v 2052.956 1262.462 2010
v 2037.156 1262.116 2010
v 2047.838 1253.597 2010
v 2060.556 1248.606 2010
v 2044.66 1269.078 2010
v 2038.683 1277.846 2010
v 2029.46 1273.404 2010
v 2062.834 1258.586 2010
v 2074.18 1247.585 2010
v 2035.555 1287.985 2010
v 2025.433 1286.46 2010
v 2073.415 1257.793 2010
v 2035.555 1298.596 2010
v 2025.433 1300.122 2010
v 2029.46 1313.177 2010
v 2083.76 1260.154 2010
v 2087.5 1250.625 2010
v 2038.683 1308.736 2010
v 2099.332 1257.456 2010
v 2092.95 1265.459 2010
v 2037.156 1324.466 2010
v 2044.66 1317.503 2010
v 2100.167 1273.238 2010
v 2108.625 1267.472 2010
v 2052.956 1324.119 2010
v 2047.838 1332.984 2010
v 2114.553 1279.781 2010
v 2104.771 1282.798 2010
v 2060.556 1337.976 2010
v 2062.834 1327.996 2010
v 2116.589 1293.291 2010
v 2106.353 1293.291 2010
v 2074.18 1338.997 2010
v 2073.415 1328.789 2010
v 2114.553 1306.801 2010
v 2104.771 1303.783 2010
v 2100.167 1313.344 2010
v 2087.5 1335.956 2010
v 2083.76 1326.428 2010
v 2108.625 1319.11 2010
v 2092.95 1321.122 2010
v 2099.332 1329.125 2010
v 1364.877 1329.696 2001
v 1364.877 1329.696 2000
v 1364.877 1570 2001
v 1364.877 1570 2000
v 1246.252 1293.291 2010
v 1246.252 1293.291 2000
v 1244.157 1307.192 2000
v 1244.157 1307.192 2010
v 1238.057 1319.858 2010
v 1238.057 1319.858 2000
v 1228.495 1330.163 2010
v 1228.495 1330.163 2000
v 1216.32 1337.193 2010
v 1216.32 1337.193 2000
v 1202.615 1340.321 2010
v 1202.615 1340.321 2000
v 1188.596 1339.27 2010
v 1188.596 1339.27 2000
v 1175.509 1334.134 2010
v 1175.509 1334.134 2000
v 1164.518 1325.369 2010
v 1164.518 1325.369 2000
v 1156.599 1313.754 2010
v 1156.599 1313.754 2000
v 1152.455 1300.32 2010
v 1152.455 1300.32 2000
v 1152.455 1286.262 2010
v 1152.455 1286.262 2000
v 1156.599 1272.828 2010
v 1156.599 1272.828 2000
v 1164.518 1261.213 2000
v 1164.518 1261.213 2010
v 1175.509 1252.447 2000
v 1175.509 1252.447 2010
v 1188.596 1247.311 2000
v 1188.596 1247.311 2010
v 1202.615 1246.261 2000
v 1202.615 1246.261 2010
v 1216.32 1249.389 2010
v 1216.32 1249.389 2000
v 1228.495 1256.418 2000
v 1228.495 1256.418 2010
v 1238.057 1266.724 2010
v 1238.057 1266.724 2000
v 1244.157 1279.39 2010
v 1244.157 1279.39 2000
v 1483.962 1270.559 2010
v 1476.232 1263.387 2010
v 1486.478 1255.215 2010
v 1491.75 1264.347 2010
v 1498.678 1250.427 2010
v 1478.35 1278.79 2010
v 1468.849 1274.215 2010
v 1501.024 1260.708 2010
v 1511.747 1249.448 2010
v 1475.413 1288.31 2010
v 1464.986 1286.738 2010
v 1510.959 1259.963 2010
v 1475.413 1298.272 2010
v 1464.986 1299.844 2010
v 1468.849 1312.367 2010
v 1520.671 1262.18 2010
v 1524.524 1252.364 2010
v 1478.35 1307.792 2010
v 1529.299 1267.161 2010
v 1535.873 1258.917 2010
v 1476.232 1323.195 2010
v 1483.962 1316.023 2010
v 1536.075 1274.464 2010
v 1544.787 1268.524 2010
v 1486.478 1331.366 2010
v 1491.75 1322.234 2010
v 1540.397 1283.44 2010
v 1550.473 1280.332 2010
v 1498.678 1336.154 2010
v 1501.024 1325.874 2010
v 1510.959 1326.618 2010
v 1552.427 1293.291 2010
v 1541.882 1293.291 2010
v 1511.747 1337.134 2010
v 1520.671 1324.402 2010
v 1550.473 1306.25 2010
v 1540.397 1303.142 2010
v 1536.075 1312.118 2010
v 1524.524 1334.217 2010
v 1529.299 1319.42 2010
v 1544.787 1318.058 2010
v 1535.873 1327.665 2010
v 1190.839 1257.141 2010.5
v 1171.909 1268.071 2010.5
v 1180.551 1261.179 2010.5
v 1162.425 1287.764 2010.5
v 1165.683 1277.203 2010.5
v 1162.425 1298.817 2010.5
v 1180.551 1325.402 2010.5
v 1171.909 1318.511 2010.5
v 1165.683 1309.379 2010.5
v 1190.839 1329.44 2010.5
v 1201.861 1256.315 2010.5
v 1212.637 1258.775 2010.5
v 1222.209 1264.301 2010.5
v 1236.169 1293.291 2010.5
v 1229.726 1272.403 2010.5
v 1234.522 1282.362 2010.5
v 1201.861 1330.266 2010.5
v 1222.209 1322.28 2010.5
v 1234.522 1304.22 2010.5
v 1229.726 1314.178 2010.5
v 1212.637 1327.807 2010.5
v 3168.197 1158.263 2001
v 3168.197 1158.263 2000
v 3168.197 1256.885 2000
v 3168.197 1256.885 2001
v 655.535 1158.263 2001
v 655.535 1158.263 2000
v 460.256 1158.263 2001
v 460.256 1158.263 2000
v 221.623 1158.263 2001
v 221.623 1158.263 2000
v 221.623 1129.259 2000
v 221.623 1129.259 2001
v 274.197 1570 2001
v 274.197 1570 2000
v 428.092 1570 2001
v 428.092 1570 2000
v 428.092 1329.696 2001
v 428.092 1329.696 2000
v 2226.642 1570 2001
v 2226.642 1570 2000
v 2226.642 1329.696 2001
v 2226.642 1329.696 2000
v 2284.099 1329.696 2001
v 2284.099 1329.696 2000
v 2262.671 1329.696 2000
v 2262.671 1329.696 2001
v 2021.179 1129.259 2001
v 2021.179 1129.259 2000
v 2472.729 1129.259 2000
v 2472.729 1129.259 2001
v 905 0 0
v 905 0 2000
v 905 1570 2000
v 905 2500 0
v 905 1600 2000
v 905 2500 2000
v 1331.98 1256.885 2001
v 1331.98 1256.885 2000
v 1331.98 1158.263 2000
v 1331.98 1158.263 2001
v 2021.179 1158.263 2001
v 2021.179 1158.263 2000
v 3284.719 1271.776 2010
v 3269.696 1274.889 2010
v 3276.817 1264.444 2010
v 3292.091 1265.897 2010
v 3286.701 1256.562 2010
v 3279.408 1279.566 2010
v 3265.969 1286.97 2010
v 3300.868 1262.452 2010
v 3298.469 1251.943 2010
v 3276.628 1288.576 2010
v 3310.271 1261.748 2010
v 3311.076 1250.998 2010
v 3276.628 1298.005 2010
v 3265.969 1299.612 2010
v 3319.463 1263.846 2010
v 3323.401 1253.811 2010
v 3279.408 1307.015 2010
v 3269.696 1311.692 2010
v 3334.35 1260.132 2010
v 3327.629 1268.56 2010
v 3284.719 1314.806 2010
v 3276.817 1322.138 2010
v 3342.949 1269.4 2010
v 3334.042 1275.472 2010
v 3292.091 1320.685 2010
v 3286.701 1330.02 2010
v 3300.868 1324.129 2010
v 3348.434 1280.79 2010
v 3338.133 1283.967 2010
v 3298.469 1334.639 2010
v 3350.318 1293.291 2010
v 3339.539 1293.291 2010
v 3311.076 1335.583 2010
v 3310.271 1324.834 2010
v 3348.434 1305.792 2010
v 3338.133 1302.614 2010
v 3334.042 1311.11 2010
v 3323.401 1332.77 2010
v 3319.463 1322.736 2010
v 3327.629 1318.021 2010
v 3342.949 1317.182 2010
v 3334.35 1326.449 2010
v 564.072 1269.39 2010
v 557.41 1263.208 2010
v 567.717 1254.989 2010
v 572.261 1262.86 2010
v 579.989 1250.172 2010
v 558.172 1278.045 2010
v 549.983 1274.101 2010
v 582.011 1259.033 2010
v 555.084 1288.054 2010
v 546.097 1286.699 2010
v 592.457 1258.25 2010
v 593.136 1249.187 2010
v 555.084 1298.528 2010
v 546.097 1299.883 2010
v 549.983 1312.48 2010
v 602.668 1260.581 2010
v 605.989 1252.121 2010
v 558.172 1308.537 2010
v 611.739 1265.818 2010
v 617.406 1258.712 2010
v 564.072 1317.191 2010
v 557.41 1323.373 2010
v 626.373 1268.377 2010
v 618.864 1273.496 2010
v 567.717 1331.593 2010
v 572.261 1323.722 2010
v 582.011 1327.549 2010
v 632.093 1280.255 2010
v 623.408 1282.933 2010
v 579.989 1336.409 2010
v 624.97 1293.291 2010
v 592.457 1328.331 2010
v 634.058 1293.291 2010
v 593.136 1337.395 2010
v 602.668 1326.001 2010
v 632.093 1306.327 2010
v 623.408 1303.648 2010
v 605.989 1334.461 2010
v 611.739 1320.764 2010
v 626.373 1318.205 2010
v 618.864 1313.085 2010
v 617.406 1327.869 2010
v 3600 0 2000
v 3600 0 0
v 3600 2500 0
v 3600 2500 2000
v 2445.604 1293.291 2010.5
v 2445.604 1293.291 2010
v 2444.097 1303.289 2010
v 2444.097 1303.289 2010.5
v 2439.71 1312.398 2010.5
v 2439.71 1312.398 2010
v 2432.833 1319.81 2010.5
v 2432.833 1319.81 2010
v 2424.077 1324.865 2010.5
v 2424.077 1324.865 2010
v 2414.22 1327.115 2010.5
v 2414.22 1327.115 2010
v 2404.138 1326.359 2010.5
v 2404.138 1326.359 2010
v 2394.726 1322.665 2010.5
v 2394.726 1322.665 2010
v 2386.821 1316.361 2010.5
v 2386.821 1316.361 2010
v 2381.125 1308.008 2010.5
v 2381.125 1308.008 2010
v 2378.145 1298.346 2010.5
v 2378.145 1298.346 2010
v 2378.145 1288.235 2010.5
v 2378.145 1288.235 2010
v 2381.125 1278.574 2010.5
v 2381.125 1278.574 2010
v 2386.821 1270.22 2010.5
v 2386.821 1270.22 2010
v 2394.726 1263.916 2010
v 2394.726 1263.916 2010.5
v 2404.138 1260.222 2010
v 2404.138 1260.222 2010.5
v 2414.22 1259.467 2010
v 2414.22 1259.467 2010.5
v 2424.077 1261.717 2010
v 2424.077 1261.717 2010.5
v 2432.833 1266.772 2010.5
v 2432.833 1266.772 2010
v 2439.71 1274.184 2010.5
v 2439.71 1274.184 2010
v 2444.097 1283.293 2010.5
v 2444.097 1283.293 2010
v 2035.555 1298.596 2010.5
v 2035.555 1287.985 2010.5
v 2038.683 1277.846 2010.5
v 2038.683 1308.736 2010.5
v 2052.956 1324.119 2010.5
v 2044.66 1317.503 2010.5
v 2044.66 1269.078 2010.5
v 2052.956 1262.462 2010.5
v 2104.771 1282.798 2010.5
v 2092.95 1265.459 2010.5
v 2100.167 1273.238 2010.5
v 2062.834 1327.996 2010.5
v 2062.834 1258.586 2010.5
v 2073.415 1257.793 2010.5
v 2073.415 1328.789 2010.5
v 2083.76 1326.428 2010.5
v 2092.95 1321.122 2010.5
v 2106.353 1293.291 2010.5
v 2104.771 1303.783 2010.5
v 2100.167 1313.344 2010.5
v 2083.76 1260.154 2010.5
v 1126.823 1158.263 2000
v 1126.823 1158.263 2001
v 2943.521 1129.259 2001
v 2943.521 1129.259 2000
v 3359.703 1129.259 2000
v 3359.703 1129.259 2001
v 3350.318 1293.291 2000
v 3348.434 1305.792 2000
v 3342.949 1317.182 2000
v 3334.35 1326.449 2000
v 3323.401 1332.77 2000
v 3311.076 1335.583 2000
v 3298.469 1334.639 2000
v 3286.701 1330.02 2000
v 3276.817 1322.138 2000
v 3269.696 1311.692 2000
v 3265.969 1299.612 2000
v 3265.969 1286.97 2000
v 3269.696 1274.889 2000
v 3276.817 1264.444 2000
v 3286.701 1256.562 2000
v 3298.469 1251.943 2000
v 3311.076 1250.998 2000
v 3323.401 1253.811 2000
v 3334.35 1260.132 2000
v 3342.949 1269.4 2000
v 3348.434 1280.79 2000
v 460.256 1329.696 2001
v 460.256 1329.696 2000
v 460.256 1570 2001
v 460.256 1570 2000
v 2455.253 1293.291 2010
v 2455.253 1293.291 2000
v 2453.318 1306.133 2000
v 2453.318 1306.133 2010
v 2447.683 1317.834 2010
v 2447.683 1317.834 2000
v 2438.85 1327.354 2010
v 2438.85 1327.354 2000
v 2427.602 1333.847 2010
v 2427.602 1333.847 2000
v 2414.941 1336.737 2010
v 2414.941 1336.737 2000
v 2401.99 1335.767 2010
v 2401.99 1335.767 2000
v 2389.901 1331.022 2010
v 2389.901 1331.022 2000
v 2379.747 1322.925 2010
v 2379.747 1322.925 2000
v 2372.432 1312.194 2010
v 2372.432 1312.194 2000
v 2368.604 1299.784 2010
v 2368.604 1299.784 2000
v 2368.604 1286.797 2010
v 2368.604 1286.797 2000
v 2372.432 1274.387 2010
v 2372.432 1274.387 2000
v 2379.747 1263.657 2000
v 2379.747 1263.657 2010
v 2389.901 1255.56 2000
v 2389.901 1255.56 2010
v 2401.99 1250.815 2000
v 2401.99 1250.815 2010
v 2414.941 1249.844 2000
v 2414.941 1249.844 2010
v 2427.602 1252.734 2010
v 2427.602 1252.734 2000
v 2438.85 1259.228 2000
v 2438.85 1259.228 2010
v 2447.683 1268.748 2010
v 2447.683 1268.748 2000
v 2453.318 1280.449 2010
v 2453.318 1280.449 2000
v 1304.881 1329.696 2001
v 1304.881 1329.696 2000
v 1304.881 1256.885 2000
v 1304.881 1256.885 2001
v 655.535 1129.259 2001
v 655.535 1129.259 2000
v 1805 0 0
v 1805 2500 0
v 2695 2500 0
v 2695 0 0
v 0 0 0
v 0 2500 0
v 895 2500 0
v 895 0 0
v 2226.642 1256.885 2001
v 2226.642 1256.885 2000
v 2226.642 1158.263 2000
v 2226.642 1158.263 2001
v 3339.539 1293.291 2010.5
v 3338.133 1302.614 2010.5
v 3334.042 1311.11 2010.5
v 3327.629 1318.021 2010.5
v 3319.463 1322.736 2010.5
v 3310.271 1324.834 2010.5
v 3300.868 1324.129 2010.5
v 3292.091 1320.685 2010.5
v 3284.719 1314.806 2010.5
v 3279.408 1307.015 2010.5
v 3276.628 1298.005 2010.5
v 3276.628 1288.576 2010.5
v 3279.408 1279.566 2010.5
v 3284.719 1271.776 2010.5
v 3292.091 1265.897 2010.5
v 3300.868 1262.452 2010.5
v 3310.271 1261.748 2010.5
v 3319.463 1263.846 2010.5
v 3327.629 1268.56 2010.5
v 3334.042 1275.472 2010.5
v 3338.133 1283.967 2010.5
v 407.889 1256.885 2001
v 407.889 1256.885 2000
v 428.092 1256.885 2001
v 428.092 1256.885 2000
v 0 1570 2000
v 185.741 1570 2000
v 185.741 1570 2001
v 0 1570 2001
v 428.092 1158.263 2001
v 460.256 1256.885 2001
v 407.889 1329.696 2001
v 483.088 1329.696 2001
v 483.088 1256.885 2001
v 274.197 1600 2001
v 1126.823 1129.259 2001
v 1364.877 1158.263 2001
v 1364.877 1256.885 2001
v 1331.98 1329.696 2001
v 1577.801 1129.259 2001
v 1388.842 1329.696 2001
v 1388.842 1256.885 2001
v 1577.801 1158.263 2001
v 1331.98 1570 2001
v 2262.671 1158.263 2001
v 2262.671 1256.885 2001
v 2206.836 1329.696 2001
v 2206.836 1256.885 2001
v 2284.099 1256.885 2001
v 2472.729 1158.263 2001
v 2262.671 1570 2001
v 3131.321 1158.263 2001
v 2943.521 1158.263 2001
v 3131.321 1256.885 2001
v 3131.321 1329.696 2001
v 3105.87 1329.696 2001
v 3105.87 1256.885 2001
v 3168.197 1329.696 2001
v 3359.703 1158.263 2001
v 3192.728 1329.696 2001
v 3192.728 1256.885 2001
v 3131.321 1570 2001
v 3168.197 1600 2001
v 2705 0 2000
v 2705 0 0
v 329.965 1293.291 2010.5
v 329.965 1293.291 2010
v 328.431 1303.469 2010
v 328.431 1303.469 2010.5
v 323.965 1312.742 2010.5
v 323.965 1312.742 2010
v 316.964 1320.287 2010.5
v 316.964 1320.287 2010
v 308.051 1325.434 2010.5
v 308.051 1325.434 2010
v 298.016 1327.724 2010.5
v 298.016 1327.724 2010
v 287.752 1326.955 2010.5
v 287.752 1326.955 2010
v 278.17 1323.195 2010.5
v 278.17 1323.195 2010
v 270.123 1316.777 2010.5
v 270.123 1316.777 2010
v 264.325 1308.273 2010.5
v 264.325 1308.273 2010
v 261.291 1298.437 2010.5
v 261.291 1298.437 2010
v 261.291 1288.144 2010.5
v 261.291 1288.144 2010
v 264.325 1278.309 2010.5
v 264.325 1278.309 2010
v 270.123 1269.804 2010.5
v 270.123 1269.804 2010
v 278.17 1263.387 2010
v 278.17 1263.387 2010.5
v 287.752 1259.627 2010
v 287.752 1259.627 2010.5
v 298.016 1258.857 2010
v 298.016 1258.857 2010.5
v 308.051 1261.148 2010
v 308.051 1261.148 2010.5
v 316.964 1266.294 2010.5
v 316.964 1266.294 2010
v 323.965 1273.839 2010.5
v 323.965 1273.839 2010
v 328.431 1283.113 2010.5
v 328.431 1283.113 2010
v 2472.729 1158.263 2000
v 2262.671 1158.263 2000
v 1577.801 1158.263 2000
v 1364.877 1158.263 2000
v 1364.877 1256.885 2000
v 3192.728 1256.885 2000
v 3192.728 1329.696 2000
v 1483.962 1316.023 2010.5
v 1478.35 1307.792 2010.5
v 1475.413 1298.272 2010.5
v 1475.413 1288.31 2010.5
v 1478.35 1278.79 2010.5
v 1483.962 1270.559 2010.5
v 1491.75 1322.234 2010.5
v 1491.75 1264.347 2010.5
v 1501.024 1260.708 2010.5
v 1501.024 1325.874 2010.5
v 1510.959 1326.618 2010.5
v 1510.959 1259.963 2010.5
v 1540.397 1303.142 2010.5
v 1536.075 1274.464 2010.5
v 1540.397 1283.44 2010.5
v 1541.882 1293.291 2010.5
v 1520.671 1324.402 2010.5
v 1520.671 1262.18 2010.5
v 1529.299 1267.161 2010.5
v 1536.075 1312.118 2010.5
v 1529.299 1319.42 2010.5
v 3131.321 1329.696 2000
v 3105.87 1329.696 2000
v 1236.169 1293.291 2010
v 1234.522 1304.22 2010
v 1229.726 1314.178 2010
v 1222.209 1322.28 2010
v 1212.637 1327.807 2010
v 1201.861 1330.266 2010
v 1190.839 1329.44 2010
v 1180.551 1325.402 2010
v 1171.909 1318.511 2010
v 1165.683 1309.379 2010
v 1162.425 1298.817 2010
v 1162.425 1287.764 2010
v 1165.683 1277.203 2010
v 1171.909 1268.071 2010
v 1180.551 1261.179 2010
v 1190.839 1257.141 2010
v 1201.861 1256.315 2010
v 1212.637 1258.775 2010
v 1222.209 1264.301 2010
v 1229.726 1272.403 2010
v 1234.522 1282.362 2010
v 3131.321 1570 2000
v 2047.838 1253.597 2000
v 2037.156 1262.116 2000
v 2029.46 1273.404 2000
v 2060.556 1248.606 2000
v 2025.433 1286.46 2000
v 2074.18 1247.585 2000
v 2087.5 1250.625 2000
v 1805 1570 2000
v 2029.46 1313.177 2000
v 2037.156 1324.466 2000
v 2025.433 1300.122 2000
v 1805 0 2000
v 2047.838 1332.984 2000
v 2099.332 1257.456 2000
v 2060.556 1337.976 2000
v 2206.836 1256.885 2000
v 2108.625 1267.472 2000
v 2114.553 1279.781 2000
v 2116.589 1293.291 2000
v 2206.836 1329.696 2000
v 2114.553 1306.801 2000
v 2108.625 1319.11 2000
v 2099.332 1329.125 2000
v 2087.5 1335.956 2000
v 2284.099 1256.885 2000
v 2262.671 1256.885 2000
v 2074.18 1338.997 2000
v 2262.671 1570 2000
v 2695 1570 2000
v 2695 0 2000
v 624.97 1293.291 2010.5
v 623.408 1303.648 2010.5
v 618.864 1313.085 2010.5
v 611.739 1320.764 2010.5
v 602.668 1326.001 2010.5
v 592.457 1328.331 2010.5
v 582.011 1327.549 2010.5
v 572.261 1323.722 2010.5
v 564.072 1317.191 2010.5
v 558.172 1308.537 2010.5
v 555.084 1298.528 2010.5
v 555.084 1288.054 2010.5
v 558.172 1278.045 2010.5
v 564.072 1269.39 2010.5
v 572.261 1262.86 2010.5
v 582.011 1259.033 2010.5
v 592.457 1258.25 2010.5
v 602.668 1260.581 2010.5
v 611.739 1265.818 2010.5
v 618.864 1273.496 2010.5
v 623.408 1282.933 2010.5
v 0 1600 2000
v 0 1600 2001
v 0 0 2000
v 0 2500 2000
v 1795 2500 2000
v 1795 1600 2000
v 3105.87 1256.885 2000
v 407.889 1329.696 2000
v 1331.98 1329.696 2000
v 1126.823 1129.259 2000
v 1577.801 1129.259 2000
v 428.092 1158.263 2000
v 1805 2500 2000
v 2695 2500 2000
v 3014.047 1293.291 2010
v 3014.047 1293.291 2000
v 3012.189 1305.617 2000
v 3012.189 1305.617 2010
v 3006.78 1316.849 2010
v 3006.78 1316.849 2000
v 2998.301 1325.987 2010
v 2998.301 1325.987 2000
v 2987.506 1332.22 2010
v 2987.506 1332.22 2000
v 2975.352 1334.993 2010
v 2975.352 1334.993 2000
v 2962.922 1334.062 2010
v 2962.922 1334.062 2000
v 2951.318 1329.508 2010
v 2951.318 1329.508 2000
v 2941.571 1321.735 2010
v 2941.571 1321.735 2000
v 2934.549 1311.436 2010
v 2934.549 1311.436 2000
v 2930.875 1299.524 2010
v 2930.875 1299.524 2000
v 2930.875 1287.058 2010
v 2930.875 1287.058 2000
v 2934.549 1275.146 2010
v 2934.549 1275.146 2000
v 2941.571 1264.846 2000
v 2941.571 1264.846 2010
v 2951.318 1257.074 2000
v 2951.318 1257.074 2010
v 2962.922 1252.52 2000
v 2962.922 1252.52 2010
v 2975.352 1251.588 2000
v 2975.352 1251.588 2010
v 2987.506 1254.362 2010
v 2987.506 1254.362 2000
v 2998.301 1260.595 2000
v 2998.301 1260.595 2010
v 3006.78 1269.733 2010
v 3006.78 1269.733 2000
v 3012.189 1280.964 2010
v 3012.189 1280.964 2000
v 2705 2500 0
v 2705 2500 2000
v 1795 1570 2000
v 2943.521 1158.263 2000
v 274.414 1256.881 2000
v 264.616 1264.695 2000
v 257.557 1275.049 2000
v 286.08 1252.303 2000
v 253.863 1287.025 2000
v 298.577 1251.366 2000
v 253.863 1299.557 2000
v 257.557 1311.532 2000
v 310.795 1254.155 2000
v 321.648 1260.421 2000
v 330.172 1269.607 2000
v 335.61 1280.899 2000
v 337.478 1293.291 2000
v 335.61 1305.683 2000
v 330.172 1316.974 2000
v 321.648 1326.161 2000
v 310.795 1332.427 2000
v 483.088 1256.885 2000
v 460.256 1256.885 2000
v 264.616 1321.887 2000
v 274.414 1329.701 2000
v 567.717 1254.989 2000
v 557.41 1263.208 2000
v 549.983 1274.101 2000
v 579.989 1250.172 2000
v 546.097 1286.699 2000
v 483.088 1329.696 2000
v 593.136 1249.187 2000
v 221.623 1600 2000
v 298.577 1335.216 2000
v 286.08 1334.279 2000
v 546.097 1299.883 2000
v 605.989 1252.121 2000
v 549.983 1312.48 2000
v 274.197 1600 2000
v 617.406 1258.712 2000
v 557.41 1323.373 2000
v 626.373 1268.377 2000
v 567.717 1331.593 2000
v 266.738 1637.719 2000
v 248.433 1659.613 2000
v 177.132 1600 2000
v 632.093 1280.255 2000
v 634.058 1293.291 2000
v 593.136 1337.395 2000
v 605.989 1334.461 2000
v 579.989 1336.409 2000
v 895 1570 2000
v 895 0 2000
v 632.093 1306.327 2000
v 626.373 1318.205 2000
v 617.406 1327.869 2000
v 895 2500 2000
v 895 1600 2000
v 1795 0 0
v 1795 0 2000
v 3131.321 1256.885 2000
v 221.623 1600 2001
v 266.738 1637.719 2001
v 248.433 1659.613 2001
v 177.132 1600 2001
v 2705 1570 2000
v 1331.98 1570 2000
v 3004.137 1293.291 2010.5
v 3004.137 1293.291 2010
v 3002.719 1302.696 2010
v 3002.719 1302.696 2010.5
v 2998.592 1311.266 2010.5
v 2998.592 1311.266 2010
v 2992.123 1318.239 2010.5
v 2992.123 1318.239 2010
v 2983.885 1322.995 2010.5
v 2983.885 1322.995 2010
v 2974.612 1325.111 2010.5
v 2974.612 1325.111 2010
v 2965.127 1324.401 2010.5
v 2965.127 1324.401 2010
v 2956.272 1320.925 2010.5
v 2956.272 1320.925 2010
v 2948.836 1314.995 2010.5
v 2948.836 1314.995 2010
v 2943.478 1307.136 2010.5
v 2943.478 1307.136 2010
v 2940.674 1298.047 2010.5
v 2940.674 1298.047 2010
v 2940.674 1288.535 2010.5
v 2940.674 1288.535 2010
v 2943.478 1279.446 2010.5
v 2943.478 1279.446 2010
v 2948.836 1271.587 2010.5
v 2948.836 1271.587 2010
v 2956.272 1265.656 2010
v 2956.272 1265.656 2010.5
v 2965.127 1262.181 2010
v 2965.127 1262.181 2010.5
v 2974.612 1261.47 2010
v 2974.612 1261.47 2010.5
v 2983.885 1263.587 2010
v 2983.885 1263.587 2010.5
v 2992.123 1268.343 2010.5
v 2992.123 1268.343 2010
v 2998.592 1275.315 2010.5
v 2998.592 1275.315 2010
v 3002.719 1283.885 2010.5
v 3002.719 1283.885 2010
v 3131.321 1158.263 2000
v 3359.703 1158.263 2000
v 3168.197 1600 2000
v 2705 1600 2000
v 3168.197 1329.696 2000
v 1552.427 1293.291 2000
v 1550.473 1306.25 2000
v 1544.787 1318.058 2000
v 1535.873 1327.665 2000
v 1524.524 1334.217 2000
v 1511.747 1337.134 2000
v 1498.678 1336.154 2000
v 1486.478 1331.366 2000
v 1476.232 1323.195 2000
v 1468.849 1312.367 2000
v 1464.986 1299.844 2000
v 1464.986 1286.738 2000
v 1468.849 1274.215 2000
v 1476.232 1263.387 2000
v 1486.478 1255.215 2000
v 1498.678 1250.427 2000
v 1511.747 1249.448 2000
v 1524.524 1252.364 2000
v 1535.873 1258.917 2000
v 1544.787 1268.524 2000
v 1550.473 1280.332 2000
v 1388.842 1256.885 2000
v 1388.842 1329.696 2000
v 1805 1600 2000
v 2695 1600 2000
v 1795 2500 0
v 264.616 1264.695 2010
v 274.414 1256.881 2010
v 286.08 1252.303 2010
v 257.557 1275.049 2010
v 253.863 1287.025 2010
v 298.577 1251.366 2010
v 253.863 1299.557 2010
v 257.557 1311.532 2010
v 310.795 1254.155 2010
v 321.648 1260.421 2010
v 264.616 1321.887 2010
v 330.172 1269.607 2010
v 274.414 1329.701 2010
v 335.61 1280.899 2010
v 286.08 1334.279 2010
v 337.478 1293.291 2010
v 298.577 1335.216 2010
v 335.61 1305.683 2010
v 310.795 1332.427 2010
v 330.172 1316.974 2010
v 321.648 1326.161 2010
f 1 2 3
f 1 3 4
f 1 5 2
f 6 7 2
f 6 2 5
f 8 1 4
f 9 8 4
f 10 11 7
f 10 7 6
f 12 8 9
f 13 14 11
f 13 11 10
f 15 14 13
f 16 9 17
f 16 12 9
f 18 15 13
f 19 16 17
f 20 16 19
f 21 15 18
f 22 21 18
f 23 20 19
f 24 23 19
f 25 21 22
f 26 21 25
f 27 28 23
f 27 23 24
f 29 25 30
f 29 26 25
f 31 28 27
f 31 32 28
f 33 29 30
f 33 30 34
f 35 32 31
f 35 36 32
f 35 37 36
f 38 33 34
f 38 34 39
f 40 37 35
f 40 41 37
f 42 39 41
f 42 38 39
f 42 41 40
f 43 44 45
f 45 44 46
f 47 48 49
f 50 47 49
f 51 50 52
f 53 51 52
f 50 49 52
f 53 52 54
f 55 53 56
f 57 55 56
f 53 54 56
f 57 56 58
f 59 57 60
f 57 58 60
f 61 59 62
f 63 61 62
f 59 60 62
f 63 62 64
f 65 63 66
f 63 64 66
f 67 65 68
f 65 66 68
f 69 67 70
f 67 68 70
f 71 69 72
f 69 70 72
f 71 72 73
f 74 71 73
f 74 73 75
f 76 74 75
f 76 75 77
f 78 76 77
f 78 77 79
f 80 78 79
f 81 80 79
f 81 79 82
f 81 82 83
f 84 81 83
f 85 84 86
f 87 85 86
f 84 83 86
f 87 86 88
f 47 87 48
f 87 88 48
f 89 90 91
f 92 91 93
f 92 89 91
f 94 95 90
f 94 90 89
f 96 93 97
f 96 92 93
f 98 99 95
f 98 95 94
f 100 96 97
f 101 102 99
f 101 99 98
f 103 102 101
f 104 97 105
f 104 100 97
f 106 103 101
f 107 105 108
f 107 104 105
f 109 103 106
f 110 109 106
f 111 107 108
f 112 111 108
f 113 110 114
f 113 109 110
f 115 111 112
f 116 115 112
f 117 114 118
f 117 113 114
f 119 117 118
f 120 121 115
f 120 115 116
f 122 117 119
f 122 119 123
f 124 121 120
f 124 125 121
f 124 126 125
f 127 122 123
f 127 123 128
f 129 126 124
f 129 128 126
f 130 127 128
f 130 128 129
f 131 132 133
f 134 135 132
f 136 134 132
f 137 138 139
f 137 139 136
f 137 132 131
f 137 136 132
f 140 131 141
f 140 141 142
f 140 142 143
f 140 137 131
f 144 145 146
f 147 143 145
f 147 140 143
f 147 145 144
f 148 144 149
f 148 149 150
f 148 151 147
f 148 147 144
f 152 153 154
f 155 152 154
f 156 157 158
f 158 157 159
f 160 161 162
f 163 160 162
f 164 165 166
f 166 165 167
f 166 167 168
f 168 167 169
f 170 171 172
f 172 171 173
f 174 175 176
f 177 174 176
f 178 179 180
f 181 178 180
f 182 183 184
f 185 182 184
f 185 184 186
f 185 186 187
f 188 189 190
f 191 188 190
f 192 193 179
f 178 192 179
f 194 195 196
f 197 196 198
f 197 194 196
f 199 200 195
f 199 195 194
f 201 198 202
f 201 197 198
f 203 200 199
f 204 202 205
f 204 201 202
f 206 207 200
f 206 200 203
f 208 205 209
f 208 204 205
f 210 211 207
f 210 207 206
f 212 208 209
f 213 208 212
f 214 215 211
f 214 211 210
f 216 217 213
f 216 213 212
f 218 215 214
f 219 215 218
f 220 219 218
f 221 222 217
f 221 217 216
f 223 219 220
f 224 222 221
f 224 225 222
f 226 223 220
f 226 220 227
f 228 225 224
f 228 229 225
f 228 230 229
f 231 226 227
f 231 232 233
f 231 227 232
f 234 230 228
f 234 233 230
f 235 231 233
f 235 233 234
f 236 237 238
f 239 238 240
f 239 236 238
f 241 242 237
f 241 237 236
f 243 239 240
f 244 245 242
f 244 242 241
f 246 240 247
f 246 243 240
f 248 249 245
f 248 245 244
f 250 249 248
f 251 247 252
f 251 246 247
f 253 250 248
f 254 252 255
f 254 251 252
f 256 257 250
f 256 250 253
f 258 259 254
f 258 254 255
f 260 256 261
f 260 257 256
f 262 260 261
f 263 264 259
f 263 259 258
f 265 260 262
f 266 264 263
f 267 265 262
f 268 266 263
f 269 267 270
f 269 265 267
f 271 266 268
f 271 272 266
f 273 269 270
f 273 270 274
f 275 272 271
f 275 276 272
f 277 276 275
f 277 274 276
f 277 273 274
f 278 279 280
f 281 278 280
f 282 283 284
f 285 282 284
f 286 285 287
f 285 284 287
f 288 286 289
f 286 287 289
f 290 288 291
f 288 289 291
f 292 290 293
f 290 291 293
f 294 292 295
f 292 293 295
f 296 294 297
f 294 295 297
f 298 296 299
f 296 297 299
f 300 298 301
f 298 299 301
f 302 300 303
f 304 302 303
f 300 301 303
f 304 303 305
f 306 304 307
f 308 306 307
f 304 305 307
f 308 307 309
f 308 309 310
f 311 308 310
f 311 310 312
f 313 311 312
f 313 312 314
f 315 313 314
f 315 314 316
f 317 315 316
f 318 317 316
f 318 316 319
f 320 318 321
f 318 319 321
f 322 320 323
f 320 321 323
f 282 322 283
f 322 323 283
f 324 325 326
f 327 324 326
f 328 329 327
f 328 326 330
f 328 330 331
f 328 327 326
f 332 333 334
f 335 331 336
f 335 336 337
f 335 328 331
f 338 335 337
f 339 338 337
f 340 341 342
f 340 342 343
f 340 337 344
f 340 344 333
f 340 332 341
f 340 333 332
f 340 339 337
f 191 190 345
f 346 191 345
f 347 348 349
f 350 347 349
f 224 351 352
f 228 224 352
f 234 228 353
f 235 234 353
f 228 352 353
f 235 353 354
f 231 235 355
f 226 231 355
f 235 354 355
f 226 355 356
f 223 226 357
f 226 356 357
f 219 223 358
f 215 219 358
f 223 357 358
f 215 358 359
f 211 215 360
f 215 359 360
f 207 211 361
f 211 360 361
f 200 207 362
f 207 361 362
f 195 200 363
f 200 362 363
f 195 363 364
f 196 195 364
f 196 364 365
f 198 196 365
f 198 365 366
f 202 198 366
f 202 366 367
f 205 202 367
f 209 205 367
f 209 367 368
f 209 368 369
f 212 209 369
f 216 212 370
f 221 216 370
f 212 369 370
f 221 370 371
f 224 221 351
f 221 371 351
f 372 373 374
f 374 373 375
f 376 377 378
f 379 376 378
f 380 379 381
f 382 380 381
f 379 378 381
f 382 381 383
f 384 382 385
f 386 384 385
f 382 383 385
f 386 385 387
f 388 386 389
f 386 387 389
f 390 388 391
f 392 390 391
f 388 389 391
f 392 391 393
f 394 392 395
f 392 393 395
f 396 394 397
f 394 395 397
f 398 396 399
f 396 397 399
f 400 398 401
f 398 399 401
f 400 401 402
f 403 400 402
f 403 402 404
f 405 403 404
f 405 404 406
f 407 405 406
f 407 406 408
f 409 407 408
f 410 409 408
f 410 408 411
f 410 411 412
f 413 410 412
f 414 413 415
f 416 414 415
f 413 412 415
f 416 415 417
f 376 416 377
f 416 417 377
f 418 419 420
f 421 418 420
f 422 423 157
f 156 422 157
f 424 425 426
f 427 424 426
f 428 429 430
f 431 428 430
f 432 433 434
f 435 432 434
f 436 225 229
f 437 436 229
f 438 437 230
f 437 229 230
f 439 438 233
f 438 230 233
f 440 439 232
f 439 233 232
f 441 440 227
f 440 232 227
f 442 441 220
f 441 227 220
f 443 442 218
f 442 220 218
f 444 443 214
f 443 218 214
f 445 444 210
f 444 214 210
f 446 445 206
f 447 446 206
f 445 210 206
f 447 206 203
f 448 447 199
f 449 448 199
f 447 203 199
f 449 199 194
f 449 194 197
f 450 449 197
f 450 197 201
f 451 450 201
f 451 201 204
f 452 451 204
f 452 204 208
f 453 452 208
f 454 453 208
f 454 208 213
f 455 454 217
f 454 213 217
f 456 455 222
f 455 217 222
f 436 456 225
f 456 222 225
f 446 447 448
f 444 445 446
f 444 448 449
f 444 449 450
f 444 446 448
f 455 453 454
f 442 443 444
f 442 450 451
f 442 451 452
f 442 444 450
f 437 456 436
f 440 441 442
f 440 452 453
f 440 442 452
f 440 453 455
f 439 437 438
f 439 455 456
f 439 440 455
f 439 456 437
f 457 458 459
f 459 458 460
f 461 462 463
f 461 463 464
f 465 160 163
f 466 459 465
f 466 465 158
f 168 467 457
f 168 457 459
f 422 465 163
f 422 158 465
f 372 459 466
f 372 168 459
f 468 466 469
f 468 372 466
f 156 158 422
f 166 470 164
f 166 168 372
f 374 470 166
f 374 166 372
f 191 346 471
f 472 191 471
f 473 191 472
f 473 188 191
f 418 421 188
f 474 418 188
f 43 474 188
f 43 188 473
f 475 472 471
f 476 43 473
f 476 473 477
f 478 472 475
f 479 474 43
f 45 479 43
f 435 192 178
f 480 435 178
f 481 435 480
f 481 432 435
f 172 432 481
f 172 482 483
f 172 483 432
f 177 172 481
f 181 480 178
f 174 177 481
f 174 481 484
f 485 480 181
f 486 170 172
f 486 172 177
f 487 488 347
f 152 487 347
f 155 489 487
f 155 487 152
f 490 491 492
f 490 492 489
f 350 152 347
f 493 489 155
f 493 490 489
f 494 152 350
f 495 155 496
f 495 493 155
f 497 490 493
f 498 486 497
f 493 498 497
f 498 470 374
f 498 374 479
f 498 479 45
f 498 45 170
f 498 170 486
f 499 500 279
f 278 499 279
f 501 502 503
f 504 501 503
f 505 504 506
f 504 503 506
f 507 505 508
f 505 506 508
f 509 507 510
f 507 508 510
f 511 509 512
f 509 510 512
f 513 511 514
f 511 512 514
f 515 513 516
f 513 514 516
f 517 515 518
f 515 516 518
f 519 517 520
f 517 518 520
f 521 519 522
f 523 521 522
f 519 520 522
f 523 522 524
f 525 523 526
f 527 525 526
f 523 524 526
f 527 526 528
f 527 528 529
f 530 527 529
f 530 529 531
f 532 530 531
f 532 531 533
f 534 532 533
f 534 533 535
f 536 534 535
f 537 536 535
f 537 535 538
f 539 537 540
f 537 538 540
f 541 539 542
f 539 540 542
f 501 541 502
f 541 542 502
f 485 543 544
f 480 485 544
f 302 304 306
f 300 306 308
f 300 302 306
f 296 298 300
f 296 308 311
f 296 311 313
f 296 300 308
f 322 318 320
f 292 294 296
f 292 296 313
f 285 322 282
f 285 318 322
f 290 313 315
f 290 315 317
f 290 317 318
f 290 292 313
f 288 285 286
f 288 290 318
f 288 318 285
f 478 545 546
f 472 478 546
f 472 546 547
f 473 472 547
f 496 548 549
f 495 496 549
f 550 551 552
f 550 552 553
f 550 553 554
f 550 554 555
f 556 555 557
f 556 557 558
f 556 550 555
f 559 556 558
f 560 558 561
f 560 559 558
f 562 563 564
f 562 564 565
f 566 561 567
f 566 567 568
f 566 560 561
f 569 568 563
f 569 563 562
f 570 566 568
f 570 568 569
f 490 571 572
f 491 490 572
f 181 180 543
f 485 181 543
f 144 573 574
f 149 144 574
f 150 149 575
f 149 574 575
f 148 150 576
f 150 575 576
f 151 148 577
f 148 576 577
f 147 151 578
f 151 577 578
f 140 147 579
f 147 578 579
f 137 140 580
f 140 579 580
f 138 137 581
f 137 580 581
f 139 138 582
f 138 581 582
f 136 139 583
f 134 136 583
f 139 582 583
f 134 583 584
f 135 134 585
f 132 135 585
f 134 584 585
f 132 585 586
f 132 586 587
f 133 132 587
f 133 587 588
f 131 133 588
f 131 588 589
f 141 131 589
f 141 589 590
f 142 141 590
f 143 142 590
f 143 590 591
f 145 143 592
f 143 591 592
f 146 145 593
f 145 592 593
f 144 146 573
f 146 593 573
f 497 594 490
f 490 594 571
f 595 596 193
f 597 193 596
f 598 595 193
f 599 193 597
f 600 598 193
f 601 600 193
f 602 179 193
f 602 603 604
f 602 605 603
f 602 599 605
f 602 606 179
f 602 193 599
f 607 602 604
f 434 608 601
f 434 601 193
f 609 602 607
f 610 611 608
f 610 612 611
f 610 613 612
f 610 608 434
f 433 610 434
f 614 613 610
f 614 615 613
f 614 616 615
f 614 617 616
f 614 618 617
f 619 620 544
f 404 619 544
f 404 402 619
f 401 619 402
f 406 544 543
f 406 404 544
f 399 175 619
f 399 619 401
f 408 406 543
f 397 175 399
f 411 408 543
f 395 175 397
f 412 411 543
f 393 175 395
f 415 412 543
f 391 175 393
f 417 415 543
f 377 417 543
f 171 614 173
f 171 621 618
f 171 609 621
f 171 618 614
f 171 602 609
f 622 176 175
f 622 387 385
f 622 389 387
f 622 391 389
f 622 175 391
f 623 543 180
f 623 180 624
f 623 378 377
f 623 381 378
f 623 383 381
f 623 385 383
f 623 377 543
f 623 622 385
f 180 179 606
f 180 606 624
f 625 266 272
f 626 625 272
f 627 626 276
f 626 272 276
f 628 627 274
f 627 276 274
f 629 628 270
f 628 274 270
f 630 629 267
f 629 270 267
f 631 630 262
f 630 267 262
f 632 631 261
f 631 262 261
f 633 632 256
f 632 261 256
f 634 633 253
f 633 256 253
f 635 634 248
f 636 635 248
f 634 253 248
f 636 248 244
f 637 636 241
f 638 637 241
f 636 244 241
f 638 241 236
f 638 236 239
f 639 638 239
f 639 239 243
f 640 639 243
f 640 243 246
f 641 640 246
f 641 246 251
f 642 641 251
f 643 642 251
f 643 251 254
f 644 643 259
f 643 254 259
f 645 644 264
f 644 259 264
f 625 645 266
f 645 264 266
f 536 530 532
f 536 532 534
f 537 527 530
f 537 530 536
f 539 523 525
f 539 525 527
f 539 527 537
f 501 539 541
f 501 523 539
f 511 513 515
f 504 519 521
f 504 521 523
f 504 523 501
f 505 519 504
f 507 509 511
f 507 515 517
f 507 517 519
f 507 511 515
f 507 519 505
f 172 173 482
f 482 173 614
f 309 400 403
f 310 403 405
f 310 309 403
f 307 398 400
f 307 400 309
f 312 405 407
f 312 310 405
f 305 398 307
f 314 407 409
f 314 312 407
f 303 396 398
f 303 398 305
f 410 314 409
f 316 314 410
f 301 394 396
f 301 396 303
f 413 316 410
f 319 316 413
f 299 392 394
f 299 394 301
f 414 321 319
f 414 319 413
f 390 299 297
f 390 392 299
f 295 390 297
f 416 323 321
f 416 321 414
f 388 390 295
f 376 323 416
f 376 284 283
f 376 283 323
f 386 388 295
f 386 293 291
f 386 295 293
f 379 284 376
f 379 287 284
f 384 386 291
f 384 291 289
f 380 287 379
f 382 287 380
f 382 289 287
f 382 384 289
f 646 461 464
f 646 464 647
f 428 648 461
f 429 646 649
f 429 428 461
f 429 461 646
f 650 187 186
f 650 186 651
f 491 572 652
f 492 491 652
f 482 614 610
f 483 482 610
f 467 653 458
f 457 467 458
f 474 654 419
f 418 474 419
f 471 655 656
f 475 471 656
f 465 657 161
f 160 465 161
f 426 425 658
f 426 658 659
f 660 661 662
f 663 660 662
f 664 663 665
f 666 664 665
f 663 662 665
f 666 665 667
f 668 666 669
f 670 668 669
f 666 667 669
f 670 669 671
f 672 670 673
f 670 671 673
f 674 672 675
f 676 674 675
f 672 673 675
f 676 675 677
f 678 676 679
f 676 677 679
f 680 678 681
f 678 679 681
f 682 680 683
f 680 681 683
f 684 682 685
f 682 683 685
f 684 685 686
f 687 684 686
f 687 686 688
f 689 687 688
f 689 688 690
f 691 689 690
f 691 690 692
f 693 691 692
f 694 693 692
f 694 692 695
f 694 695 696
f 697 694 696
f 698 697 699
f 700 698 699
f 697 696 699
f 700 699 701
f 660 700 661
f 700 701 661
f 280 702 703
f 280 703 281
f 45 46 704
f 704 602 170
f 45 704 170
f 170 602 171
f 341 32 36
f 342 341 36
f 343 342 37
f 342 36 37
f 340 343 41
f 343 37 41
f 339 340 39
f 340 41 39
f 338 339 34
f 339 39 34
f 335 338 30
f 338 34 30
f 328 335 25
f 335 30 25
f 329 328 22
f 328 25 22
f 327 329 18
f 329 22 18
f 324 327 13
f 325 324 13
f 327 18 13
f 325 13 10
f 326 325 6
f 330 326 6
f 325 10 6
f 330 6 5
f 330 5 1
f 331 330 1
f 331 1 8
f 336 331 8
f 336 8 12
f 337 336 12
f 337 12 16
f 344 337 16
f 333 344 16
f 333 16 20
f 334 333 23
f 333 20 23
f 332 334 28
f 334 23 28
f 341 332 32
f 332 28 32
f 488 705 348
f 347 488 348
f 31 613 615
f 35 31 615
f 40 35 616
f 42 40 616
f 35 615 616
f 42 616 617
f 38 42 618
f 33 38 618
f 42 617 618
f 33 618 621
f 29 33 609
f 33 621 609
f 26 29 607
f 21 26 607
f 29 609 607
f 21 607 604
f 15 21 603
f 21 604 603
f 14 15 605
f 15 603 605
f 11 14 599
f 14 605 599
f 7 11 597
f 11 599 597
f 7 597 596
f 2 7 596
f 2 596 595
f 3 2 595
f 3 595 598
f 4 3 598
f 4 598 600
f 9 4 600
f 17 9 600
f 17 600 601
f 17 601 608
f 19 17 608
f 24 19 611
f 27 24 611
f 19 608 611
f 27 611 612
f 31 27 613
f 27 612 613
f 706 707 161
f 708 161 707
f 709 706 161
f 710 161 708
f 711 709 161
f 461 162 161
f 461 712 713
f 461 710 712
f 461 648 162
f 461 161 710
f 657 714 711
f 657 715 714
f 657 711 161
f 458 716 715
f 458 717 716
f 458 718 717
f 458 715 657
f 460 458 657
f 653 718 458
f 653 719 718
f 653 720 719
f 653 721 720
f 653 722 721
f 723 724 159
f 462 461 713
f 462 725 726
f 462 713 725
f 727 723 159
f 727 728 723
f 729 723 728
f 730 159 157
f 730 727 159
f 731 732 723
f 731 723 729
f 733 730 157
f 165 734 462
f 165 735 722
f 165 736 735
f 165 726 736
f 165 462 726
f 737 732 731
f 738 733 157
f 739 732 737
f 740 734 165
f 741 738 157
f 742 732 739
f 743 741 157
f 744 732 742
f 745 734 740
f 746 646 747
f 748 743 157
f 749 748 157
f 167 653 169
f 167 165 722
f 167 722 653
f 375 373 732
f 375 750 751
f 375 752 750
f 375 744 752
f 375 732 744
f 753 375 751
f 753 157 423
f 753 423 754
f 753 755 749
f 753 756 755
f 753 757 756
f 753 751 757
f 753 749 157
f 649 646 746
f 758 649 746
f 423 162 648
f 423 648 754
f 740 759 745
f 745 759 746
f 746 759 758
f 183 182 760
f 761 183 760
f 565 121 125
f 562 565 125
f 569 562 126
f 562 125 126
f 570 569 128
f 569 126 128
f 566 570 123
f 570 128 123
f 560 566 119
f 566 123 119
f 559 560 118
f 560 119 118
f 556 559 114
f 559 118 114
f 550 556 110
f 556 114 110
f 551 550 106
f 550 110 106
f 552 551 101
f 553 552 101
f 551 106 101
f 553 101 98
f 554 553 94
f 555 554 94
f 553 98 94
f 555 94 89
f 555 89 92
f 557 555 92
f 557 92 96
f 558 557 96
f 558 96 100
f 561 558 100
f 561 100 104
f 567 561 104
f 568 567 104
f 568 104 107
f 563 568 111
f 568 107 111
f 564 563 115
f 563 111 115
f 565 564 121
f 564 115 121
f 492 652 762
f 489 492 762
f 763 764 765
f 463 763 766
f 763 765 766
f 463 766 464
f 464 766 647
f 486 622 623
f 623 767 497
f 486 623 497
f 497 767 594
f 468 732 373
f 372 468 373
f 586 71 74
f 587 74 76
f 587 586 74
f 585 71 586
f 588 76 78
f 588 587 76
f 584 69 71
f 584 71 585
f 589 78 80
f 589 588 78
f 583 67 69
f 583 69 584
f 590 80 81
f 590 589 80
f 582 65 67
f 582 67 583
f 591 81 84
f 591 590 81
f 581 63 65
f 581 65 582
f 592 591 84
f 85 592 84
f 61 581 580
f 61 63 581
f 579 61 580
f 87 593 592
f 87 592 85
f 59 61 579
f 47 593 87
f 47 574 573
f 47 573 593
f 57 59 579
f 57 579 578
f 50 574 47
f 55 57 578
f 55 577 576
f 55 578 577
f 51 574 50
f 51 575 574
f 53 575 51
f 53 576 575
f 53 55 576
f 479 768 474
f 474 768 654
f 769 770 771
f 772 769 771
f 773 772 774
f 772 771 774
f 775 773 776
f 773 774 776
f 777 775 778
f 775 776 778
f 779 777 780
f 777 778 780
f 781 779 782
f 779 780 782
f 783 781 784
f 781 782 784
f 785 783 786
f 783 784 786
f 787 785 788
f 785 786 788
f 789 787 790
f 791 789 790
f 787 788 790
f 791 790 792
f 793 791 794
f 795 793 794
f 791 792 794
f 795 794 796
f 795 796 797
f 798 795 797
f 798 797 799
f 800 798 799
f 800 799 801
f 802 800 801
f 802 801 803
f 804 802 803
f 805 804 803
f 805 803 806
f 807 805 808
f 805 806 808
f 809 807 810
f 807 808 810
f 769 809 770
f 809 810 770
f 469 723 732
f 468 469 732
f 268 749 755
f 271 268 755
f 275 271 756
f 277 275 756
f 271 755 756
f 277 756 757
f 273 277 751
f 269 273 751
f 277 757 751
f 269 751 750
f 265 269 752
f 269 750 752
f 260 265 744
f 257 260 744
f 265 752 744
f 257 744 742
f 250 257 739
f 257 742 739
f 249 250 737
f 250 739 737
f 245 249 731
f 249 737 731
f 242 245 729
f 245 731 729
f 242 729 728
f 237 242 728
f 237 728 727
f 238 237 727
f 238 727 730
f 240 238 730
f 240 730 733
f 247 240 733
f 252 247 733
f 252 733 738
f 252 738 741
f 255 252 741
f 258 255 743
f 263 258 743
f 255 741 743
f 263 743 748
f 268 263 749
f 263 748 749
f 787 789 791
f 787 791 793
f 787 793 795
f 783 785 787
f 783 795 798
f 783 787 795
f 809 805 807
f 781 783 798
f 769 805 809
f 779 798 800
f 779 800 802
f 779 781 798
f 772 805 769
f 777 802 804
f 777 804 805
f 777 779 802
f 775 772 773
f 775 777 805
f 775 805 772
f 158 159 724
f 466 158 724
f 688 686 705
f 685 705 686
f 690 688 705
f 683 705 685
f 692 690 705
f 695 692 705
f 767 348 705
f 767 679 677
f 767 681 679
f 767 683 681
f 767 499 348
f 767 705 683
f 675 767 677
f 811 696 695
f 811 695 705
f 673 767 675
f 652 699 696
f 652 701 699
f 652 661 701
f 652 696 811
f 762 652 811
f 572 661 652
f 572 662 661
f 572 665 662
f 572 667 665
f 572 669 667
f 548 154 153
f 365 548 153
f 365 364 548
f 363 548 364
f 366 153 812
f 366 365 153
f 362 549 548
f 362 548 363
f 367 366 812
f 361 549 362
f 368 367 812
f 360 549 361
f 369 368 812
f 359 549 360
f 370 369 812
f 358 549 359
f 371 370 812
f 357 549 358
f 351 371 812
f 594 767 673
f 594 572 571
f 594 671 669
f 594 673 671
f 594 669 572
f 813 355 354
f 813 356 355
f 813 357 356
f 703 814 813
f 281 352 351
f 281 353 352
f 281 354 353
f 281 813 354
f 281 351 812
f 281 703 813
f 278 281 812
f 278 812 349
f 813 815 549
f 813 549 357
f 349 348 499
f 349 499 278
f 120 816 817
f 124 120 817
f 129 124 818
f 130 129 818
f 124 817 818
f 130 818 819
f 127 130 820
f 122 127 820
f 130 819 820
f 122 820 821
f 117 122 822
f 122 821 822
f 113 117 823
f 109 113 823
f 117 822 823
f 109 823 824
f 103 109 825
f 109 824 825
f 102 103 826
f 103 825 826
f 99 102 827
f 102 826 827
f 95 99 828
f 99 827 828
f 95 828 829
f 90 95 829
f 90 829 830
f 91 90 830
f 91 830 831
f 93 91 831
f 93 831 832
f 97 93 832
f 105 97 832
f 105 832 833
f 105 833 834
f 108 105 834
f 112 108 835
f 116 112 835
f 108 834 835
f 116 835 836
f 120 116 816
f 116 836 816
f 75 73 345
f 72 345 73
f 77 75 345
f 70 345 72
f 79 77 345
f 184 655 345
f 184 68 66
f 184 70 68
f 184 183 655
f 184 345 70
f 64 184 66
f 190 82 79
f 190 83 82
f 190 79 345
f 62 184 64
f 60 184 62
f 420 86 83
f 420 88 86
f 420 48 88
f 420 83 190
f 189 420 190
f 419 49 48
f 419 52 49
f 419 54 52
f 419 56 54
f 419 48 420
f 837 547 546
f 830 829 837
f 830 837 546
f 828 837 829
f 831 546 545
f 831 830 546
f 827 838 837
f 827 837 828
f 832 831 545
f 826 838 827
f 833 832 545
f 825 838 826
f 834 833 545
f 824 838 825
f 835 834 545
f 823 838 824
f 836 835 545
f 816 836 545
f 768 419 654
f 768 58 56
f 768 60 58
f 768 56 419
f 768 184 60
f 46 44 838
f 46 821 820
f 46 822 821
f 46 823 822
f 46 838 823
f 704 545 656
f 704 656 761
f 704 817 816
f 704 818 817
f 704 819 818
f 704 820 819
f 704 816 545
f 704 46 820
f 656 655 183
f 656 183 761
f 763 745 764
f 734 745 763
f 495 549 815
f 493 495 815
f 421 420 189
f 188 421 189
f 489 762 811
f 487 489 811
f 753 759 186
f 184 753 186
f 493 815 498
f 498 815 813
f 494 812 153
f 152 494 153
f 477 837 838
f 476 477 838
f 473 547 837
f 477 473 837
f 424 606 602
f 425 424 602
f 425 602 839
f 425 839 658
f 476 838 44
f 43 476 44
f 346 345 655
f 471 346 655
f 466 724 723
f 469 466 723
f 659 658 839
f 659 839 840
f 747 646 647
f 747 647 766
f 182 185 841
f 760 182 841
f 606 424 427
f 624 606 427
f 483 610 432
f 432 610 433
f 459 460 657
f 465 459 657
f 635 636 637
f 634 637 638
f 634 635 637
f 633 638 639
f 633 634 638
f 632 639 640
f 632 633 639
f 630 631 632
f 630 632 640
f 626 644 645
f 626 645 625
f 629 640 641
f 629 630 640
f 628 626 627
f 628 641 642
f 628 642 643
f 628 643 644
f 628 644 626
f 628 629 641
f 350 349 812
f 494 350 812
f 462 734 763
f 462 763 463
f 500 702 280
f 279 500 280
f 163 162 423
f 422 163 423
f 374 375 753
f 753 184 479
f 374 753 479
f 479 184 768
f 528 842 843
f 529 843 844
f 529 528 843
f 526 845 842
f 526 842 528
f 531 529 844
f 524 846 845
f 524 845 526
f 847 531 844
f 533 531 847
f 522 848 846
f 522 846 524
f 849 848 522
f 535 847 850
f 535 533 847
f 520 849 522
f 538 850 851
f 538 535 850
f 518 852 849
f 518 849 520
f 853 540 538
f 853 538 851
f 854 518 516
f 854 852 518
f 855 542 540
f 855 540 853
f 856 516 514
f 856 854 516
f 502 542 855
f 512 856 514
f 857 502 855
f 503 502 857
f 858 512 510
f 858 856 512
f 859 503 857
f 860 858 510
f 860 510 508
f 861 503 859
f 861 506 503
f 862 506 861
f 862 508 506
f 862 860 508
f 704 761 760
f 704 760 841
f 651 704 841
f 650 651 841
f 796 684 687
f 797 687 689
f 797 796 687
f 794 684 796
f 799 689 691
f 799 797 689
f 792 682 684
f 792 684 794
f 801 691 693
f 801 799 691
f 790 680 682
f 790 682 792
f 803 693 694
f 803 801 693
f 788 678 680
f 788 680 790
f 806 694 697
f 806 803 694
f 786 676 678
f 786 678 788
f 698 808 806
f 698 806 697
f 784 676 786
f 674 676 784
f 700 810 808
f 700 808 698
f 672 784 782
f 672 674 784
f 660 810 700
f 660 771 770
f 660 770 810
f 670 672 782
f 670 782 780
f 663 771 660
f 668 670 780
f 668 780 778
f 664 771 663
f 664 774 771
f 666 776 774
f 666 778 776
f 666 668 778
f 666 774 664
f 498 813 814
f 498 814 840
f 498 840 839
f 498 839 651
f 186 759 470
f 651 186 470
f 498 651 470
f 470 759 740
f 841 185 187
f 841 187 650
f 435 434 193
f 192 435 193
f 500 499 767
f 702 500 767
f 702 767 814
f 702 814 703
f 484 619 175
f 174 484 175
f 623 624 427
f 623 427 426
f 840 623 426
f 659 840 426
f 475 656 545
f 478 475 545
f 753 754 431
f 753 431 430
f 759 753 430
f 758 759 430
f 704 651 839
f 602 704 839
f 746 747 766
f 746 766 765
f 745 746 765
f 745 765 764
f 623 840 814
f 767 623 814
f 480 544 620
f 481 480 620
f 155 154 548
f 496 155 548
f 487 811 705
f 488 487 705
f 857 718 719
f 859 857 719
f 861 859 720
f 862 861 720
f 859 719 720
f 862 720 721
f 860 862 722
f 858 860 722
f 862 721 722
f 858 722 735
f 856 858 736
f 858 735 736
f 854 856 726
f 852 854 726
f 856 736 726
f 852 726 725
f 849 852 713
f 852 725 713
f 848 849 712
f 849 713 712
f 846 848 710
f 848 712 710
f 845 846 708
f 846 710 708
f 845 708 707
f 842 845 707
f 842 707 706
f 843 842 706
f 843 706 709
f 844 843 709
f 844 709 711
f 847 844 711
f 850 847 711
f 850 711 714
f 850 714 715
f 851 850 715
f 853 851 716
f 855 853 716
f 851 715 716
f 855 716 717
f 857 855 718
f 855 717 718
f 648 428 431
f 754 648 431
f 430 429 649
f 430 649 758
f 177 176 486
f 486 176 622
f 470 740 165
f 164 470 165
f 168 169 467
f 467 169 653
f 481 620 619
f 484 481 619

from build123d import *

# Parameters (mm, degrees)
CROQUIS1_W              = 3600
CROQUIS1_H              = 2500
SALIENTE_EXTRUIR1_DEPTH = 2000
CROQUIS3_W              = 10
CROQUIS3_H              = 2500
CORTAR_EXTRUIR1_DEPTH   = 2000
SALIENTE_EXTRUIR2_DEPTH = 1
CROQUIS5_R              = 42.042349856
CROQUIS5_R_2            = 44.227433636
CROQUIS5_R_3            = 47.161857107
CROQUIS5_R_4            = 43.965695281
CROQUIS5_R_5            = 45.833892846
CROQUIS5_R_6            = 43.568215229
CROQUIS5_R_7            = 41.81955042
CROQUIS5_R_8            = 42.411091006
SALIENTE_EXTRUIR3_DEPTH = 10
CROQUIS6_R              = 34.529979584
CROQUIS6_R_2            = 35.138962303
CROQUIS6_R_3            = 37.079078028
CROQUIS6_R_4            = 33.421162006
CROQUIS6_R_5            = 35.597607771
CROQUIS6_R_6            = 33.918842717
CROQUIS6_R_7            = 31.90982207
CROQUIS6_R_8            = 31.631714901
SALIENTE_EXTRUIR4_DEPTH = 0.5


with BuildPart() as part:
    # Croquis1 → Saliente-Extruir1 (new body)
    with BuildSketch(Plane.XY):
        with Locations((1800, 1250)):
            Rectangle(CROQUIS1_W, CROQUIS1_H)
    extrude(amount=SALIENTE_EXTRUIR1_DEPTH)

    # Croquis3 → Cortar-Extruir1 (cut)
    with BuildSketch(Plane.XY.offset(2000)):
        with Locations((900, 1250)):
            Rectangle(CROQUIS3_W, CROQUIS3_H)
        with Locations((1800, 1250)):
            Rectangle(CROQUIS3_W, CROQUIS3_H)
        with Locations((2700, 1250)):
            Rectangle(CROQUIS3_W, CROQUIS3_H)
    extrude(amount=-CORTAR_EXTRUIR1_DEPTH, mode=Mode.SUBTRACT)

    # Croquis4 → Saliente-Extruir2 (add)
    with BuildSketch(Plane.XY.offset(2000)):
        Polygon((0, 1600), (177.131722561, 1600), (248.433073904, 1659.612953528), (266.737801234, 1637.719191898), (221.622952956, 1600), (185.740809669, 1570), (0, 1570), align=None)
        Polygon((2262.67056397, 1570), (3131.321237056, 1570), (3131.321237056, 1329.696449822), (3105.870170693, 1329.696449822), (3105.870170693, 1256.885113309), (3131.321237056, 1256.885113309), (3131.321237056, 1158.262993453), (2943.521251595, 1158.262993453), (2943.521251595, 1129.2585574), (3359.702855334, 1129.2585574), (3359.702855334, 1158.262993453), (3168.197091237, 1158.262993453), (3168.197091237, 1256.885113309), (3192.727563387, 1256.885113309), (3192.727563387, 1329.696449822), (3168.197091237, 1329.696449822), (3168.197091237, 1570), (3168.197091237, 1600), (274.19742775, 1600), (274.19742775, 1570), (428.091552217, 1570), (428.091552217, 1329.696449822), (407.889246887, 1329.696449822), (407.889246887, 1256.885113309), (428.091552217, 1256.885113309), (428.091552217, 1158.262993453), (221.622952956, 1158.262993453), (221.622952956, 1129.2585574), (655.534740684, 1129.2585574), (655.534740684, 1158.262993453), (460.255695781, 1158.262993453), (460.255695781, 1256.885113309), (483.087840335, 1256.885113309), (483.087840335, 1329.696449822), (460.255695781, 1329.696449822), (460.255695781, 1570), (1331.979926835, 1570), (1331.979926835, 1329.696449822), (1304.880988731, 1329.696449822), (1304.880988731, 1256.885113309), (1331.979926835, 1256.885113309), (1331.979926835, 1158.262993453), (1126.823452844, 1158.262993453), (1126.823452844, 1129.2585574), (1577.800681664, 1129.2585574), (1577.800681664, 1158.262993453), (1364.876608308, 1158.262993453), (1364.876608308, 1256.885113309), (1388.842422483, 1256.885113309), (1388.842422483, 1329.696449822), (1364.876608308, 1329.696449822), (1364.876608308, 1570), (2226.641720181, 1570), (2226.641720181, 1329.696449822), (2206.83575822, 1329.696449822), (2206.83575822, 1256.885113309), (2226.641720181, 1256.885113309), (2226.641720181, 1158.262993453), (2021.178837256, 1158.262993453), (2021.178837256, 1129.2585574), (2472.729026323, 1129.2585574), (2472.729026323, 1158.262993453), (2262.67056397, 1158.262993453), (2262.67056397, 1256.885113309), (2284.098867396, 1256.885113309), (2284.098867396, 1329.696449822), (2262.67056397, 1329.696449822), align=None)
    extrude(amount=SALIENTE_EXTRUIR2_DEPTH)

    # Croquis5 → Saliente-Extruir3 (add)
    with BuildSketch(Plane.XY.offset(2000)):
        with Locations((295.435400679, 1293.290781566)):
            Circle(CROQUIS5_R)
        with Locations((589.830635079, 1293.290781566)):
            Circle(CROQUIS5_R_2)
        with Locations((1199.09009137, 1293.290781566)):
            Circle(CROQUIS5_R_3)
        with Locations((1508.461031639, 1293.290781566)):
            Circle(CROQUIS5_R_4)
        with Locations((2070.755084005, 1293.290781566)):
            Circle(CROQUIS5_R_5)
        with Locations((2411.685220759, 1293.290781566)):
            Circle(CROQUIS5_R_6)
        with Locations((2972.227319814, 1293.290781566)):
            Circle(CROQUIS5_R_7)
        with Locations((3307.906835958, 1293.290781566)):
            Circle(CROQUIS5_R_8)
    extrude(amount=SALIENTE_EXTRUIR3_DEPTH)

    # Croquis6 → Saliente-Extruir4 (add)
    with BuildSketch(Plane.XY.offset(2010)):
        with Locations((295.435400679, 1293.290781566)):
            Circle(CROQUIS6_R)
        with Locations((589.830635079, 1293.290781566)):
            Circle(CROQUIS6_R_2)
        with Locations((1199.09009137, 1293.290781566)):
            Circle(CROQUIS6_R_3)
        with Locations((1508.461031639, 1293.290781566)):
            Circle(CROQUIS6_R_4)
        with Locations((2070.755084005, 1293.290781566)):
            Circle(CROQUIS6_R_5)
        with Locations((2411.685220759, 1293.290781566)):
            Circle(CROQUIS6_R_6)
        with Locations((2972.227319814, 1293.290781566)):
            Circle(CROQUIS6_R_7)
        with Locations((3307.906835958, 1293.290781566)):
            Circle(CROQUIS6_R_8)
    extrude(amount=SALIENTE_EXTRUIR4_DEPTH)


solid = part.part
